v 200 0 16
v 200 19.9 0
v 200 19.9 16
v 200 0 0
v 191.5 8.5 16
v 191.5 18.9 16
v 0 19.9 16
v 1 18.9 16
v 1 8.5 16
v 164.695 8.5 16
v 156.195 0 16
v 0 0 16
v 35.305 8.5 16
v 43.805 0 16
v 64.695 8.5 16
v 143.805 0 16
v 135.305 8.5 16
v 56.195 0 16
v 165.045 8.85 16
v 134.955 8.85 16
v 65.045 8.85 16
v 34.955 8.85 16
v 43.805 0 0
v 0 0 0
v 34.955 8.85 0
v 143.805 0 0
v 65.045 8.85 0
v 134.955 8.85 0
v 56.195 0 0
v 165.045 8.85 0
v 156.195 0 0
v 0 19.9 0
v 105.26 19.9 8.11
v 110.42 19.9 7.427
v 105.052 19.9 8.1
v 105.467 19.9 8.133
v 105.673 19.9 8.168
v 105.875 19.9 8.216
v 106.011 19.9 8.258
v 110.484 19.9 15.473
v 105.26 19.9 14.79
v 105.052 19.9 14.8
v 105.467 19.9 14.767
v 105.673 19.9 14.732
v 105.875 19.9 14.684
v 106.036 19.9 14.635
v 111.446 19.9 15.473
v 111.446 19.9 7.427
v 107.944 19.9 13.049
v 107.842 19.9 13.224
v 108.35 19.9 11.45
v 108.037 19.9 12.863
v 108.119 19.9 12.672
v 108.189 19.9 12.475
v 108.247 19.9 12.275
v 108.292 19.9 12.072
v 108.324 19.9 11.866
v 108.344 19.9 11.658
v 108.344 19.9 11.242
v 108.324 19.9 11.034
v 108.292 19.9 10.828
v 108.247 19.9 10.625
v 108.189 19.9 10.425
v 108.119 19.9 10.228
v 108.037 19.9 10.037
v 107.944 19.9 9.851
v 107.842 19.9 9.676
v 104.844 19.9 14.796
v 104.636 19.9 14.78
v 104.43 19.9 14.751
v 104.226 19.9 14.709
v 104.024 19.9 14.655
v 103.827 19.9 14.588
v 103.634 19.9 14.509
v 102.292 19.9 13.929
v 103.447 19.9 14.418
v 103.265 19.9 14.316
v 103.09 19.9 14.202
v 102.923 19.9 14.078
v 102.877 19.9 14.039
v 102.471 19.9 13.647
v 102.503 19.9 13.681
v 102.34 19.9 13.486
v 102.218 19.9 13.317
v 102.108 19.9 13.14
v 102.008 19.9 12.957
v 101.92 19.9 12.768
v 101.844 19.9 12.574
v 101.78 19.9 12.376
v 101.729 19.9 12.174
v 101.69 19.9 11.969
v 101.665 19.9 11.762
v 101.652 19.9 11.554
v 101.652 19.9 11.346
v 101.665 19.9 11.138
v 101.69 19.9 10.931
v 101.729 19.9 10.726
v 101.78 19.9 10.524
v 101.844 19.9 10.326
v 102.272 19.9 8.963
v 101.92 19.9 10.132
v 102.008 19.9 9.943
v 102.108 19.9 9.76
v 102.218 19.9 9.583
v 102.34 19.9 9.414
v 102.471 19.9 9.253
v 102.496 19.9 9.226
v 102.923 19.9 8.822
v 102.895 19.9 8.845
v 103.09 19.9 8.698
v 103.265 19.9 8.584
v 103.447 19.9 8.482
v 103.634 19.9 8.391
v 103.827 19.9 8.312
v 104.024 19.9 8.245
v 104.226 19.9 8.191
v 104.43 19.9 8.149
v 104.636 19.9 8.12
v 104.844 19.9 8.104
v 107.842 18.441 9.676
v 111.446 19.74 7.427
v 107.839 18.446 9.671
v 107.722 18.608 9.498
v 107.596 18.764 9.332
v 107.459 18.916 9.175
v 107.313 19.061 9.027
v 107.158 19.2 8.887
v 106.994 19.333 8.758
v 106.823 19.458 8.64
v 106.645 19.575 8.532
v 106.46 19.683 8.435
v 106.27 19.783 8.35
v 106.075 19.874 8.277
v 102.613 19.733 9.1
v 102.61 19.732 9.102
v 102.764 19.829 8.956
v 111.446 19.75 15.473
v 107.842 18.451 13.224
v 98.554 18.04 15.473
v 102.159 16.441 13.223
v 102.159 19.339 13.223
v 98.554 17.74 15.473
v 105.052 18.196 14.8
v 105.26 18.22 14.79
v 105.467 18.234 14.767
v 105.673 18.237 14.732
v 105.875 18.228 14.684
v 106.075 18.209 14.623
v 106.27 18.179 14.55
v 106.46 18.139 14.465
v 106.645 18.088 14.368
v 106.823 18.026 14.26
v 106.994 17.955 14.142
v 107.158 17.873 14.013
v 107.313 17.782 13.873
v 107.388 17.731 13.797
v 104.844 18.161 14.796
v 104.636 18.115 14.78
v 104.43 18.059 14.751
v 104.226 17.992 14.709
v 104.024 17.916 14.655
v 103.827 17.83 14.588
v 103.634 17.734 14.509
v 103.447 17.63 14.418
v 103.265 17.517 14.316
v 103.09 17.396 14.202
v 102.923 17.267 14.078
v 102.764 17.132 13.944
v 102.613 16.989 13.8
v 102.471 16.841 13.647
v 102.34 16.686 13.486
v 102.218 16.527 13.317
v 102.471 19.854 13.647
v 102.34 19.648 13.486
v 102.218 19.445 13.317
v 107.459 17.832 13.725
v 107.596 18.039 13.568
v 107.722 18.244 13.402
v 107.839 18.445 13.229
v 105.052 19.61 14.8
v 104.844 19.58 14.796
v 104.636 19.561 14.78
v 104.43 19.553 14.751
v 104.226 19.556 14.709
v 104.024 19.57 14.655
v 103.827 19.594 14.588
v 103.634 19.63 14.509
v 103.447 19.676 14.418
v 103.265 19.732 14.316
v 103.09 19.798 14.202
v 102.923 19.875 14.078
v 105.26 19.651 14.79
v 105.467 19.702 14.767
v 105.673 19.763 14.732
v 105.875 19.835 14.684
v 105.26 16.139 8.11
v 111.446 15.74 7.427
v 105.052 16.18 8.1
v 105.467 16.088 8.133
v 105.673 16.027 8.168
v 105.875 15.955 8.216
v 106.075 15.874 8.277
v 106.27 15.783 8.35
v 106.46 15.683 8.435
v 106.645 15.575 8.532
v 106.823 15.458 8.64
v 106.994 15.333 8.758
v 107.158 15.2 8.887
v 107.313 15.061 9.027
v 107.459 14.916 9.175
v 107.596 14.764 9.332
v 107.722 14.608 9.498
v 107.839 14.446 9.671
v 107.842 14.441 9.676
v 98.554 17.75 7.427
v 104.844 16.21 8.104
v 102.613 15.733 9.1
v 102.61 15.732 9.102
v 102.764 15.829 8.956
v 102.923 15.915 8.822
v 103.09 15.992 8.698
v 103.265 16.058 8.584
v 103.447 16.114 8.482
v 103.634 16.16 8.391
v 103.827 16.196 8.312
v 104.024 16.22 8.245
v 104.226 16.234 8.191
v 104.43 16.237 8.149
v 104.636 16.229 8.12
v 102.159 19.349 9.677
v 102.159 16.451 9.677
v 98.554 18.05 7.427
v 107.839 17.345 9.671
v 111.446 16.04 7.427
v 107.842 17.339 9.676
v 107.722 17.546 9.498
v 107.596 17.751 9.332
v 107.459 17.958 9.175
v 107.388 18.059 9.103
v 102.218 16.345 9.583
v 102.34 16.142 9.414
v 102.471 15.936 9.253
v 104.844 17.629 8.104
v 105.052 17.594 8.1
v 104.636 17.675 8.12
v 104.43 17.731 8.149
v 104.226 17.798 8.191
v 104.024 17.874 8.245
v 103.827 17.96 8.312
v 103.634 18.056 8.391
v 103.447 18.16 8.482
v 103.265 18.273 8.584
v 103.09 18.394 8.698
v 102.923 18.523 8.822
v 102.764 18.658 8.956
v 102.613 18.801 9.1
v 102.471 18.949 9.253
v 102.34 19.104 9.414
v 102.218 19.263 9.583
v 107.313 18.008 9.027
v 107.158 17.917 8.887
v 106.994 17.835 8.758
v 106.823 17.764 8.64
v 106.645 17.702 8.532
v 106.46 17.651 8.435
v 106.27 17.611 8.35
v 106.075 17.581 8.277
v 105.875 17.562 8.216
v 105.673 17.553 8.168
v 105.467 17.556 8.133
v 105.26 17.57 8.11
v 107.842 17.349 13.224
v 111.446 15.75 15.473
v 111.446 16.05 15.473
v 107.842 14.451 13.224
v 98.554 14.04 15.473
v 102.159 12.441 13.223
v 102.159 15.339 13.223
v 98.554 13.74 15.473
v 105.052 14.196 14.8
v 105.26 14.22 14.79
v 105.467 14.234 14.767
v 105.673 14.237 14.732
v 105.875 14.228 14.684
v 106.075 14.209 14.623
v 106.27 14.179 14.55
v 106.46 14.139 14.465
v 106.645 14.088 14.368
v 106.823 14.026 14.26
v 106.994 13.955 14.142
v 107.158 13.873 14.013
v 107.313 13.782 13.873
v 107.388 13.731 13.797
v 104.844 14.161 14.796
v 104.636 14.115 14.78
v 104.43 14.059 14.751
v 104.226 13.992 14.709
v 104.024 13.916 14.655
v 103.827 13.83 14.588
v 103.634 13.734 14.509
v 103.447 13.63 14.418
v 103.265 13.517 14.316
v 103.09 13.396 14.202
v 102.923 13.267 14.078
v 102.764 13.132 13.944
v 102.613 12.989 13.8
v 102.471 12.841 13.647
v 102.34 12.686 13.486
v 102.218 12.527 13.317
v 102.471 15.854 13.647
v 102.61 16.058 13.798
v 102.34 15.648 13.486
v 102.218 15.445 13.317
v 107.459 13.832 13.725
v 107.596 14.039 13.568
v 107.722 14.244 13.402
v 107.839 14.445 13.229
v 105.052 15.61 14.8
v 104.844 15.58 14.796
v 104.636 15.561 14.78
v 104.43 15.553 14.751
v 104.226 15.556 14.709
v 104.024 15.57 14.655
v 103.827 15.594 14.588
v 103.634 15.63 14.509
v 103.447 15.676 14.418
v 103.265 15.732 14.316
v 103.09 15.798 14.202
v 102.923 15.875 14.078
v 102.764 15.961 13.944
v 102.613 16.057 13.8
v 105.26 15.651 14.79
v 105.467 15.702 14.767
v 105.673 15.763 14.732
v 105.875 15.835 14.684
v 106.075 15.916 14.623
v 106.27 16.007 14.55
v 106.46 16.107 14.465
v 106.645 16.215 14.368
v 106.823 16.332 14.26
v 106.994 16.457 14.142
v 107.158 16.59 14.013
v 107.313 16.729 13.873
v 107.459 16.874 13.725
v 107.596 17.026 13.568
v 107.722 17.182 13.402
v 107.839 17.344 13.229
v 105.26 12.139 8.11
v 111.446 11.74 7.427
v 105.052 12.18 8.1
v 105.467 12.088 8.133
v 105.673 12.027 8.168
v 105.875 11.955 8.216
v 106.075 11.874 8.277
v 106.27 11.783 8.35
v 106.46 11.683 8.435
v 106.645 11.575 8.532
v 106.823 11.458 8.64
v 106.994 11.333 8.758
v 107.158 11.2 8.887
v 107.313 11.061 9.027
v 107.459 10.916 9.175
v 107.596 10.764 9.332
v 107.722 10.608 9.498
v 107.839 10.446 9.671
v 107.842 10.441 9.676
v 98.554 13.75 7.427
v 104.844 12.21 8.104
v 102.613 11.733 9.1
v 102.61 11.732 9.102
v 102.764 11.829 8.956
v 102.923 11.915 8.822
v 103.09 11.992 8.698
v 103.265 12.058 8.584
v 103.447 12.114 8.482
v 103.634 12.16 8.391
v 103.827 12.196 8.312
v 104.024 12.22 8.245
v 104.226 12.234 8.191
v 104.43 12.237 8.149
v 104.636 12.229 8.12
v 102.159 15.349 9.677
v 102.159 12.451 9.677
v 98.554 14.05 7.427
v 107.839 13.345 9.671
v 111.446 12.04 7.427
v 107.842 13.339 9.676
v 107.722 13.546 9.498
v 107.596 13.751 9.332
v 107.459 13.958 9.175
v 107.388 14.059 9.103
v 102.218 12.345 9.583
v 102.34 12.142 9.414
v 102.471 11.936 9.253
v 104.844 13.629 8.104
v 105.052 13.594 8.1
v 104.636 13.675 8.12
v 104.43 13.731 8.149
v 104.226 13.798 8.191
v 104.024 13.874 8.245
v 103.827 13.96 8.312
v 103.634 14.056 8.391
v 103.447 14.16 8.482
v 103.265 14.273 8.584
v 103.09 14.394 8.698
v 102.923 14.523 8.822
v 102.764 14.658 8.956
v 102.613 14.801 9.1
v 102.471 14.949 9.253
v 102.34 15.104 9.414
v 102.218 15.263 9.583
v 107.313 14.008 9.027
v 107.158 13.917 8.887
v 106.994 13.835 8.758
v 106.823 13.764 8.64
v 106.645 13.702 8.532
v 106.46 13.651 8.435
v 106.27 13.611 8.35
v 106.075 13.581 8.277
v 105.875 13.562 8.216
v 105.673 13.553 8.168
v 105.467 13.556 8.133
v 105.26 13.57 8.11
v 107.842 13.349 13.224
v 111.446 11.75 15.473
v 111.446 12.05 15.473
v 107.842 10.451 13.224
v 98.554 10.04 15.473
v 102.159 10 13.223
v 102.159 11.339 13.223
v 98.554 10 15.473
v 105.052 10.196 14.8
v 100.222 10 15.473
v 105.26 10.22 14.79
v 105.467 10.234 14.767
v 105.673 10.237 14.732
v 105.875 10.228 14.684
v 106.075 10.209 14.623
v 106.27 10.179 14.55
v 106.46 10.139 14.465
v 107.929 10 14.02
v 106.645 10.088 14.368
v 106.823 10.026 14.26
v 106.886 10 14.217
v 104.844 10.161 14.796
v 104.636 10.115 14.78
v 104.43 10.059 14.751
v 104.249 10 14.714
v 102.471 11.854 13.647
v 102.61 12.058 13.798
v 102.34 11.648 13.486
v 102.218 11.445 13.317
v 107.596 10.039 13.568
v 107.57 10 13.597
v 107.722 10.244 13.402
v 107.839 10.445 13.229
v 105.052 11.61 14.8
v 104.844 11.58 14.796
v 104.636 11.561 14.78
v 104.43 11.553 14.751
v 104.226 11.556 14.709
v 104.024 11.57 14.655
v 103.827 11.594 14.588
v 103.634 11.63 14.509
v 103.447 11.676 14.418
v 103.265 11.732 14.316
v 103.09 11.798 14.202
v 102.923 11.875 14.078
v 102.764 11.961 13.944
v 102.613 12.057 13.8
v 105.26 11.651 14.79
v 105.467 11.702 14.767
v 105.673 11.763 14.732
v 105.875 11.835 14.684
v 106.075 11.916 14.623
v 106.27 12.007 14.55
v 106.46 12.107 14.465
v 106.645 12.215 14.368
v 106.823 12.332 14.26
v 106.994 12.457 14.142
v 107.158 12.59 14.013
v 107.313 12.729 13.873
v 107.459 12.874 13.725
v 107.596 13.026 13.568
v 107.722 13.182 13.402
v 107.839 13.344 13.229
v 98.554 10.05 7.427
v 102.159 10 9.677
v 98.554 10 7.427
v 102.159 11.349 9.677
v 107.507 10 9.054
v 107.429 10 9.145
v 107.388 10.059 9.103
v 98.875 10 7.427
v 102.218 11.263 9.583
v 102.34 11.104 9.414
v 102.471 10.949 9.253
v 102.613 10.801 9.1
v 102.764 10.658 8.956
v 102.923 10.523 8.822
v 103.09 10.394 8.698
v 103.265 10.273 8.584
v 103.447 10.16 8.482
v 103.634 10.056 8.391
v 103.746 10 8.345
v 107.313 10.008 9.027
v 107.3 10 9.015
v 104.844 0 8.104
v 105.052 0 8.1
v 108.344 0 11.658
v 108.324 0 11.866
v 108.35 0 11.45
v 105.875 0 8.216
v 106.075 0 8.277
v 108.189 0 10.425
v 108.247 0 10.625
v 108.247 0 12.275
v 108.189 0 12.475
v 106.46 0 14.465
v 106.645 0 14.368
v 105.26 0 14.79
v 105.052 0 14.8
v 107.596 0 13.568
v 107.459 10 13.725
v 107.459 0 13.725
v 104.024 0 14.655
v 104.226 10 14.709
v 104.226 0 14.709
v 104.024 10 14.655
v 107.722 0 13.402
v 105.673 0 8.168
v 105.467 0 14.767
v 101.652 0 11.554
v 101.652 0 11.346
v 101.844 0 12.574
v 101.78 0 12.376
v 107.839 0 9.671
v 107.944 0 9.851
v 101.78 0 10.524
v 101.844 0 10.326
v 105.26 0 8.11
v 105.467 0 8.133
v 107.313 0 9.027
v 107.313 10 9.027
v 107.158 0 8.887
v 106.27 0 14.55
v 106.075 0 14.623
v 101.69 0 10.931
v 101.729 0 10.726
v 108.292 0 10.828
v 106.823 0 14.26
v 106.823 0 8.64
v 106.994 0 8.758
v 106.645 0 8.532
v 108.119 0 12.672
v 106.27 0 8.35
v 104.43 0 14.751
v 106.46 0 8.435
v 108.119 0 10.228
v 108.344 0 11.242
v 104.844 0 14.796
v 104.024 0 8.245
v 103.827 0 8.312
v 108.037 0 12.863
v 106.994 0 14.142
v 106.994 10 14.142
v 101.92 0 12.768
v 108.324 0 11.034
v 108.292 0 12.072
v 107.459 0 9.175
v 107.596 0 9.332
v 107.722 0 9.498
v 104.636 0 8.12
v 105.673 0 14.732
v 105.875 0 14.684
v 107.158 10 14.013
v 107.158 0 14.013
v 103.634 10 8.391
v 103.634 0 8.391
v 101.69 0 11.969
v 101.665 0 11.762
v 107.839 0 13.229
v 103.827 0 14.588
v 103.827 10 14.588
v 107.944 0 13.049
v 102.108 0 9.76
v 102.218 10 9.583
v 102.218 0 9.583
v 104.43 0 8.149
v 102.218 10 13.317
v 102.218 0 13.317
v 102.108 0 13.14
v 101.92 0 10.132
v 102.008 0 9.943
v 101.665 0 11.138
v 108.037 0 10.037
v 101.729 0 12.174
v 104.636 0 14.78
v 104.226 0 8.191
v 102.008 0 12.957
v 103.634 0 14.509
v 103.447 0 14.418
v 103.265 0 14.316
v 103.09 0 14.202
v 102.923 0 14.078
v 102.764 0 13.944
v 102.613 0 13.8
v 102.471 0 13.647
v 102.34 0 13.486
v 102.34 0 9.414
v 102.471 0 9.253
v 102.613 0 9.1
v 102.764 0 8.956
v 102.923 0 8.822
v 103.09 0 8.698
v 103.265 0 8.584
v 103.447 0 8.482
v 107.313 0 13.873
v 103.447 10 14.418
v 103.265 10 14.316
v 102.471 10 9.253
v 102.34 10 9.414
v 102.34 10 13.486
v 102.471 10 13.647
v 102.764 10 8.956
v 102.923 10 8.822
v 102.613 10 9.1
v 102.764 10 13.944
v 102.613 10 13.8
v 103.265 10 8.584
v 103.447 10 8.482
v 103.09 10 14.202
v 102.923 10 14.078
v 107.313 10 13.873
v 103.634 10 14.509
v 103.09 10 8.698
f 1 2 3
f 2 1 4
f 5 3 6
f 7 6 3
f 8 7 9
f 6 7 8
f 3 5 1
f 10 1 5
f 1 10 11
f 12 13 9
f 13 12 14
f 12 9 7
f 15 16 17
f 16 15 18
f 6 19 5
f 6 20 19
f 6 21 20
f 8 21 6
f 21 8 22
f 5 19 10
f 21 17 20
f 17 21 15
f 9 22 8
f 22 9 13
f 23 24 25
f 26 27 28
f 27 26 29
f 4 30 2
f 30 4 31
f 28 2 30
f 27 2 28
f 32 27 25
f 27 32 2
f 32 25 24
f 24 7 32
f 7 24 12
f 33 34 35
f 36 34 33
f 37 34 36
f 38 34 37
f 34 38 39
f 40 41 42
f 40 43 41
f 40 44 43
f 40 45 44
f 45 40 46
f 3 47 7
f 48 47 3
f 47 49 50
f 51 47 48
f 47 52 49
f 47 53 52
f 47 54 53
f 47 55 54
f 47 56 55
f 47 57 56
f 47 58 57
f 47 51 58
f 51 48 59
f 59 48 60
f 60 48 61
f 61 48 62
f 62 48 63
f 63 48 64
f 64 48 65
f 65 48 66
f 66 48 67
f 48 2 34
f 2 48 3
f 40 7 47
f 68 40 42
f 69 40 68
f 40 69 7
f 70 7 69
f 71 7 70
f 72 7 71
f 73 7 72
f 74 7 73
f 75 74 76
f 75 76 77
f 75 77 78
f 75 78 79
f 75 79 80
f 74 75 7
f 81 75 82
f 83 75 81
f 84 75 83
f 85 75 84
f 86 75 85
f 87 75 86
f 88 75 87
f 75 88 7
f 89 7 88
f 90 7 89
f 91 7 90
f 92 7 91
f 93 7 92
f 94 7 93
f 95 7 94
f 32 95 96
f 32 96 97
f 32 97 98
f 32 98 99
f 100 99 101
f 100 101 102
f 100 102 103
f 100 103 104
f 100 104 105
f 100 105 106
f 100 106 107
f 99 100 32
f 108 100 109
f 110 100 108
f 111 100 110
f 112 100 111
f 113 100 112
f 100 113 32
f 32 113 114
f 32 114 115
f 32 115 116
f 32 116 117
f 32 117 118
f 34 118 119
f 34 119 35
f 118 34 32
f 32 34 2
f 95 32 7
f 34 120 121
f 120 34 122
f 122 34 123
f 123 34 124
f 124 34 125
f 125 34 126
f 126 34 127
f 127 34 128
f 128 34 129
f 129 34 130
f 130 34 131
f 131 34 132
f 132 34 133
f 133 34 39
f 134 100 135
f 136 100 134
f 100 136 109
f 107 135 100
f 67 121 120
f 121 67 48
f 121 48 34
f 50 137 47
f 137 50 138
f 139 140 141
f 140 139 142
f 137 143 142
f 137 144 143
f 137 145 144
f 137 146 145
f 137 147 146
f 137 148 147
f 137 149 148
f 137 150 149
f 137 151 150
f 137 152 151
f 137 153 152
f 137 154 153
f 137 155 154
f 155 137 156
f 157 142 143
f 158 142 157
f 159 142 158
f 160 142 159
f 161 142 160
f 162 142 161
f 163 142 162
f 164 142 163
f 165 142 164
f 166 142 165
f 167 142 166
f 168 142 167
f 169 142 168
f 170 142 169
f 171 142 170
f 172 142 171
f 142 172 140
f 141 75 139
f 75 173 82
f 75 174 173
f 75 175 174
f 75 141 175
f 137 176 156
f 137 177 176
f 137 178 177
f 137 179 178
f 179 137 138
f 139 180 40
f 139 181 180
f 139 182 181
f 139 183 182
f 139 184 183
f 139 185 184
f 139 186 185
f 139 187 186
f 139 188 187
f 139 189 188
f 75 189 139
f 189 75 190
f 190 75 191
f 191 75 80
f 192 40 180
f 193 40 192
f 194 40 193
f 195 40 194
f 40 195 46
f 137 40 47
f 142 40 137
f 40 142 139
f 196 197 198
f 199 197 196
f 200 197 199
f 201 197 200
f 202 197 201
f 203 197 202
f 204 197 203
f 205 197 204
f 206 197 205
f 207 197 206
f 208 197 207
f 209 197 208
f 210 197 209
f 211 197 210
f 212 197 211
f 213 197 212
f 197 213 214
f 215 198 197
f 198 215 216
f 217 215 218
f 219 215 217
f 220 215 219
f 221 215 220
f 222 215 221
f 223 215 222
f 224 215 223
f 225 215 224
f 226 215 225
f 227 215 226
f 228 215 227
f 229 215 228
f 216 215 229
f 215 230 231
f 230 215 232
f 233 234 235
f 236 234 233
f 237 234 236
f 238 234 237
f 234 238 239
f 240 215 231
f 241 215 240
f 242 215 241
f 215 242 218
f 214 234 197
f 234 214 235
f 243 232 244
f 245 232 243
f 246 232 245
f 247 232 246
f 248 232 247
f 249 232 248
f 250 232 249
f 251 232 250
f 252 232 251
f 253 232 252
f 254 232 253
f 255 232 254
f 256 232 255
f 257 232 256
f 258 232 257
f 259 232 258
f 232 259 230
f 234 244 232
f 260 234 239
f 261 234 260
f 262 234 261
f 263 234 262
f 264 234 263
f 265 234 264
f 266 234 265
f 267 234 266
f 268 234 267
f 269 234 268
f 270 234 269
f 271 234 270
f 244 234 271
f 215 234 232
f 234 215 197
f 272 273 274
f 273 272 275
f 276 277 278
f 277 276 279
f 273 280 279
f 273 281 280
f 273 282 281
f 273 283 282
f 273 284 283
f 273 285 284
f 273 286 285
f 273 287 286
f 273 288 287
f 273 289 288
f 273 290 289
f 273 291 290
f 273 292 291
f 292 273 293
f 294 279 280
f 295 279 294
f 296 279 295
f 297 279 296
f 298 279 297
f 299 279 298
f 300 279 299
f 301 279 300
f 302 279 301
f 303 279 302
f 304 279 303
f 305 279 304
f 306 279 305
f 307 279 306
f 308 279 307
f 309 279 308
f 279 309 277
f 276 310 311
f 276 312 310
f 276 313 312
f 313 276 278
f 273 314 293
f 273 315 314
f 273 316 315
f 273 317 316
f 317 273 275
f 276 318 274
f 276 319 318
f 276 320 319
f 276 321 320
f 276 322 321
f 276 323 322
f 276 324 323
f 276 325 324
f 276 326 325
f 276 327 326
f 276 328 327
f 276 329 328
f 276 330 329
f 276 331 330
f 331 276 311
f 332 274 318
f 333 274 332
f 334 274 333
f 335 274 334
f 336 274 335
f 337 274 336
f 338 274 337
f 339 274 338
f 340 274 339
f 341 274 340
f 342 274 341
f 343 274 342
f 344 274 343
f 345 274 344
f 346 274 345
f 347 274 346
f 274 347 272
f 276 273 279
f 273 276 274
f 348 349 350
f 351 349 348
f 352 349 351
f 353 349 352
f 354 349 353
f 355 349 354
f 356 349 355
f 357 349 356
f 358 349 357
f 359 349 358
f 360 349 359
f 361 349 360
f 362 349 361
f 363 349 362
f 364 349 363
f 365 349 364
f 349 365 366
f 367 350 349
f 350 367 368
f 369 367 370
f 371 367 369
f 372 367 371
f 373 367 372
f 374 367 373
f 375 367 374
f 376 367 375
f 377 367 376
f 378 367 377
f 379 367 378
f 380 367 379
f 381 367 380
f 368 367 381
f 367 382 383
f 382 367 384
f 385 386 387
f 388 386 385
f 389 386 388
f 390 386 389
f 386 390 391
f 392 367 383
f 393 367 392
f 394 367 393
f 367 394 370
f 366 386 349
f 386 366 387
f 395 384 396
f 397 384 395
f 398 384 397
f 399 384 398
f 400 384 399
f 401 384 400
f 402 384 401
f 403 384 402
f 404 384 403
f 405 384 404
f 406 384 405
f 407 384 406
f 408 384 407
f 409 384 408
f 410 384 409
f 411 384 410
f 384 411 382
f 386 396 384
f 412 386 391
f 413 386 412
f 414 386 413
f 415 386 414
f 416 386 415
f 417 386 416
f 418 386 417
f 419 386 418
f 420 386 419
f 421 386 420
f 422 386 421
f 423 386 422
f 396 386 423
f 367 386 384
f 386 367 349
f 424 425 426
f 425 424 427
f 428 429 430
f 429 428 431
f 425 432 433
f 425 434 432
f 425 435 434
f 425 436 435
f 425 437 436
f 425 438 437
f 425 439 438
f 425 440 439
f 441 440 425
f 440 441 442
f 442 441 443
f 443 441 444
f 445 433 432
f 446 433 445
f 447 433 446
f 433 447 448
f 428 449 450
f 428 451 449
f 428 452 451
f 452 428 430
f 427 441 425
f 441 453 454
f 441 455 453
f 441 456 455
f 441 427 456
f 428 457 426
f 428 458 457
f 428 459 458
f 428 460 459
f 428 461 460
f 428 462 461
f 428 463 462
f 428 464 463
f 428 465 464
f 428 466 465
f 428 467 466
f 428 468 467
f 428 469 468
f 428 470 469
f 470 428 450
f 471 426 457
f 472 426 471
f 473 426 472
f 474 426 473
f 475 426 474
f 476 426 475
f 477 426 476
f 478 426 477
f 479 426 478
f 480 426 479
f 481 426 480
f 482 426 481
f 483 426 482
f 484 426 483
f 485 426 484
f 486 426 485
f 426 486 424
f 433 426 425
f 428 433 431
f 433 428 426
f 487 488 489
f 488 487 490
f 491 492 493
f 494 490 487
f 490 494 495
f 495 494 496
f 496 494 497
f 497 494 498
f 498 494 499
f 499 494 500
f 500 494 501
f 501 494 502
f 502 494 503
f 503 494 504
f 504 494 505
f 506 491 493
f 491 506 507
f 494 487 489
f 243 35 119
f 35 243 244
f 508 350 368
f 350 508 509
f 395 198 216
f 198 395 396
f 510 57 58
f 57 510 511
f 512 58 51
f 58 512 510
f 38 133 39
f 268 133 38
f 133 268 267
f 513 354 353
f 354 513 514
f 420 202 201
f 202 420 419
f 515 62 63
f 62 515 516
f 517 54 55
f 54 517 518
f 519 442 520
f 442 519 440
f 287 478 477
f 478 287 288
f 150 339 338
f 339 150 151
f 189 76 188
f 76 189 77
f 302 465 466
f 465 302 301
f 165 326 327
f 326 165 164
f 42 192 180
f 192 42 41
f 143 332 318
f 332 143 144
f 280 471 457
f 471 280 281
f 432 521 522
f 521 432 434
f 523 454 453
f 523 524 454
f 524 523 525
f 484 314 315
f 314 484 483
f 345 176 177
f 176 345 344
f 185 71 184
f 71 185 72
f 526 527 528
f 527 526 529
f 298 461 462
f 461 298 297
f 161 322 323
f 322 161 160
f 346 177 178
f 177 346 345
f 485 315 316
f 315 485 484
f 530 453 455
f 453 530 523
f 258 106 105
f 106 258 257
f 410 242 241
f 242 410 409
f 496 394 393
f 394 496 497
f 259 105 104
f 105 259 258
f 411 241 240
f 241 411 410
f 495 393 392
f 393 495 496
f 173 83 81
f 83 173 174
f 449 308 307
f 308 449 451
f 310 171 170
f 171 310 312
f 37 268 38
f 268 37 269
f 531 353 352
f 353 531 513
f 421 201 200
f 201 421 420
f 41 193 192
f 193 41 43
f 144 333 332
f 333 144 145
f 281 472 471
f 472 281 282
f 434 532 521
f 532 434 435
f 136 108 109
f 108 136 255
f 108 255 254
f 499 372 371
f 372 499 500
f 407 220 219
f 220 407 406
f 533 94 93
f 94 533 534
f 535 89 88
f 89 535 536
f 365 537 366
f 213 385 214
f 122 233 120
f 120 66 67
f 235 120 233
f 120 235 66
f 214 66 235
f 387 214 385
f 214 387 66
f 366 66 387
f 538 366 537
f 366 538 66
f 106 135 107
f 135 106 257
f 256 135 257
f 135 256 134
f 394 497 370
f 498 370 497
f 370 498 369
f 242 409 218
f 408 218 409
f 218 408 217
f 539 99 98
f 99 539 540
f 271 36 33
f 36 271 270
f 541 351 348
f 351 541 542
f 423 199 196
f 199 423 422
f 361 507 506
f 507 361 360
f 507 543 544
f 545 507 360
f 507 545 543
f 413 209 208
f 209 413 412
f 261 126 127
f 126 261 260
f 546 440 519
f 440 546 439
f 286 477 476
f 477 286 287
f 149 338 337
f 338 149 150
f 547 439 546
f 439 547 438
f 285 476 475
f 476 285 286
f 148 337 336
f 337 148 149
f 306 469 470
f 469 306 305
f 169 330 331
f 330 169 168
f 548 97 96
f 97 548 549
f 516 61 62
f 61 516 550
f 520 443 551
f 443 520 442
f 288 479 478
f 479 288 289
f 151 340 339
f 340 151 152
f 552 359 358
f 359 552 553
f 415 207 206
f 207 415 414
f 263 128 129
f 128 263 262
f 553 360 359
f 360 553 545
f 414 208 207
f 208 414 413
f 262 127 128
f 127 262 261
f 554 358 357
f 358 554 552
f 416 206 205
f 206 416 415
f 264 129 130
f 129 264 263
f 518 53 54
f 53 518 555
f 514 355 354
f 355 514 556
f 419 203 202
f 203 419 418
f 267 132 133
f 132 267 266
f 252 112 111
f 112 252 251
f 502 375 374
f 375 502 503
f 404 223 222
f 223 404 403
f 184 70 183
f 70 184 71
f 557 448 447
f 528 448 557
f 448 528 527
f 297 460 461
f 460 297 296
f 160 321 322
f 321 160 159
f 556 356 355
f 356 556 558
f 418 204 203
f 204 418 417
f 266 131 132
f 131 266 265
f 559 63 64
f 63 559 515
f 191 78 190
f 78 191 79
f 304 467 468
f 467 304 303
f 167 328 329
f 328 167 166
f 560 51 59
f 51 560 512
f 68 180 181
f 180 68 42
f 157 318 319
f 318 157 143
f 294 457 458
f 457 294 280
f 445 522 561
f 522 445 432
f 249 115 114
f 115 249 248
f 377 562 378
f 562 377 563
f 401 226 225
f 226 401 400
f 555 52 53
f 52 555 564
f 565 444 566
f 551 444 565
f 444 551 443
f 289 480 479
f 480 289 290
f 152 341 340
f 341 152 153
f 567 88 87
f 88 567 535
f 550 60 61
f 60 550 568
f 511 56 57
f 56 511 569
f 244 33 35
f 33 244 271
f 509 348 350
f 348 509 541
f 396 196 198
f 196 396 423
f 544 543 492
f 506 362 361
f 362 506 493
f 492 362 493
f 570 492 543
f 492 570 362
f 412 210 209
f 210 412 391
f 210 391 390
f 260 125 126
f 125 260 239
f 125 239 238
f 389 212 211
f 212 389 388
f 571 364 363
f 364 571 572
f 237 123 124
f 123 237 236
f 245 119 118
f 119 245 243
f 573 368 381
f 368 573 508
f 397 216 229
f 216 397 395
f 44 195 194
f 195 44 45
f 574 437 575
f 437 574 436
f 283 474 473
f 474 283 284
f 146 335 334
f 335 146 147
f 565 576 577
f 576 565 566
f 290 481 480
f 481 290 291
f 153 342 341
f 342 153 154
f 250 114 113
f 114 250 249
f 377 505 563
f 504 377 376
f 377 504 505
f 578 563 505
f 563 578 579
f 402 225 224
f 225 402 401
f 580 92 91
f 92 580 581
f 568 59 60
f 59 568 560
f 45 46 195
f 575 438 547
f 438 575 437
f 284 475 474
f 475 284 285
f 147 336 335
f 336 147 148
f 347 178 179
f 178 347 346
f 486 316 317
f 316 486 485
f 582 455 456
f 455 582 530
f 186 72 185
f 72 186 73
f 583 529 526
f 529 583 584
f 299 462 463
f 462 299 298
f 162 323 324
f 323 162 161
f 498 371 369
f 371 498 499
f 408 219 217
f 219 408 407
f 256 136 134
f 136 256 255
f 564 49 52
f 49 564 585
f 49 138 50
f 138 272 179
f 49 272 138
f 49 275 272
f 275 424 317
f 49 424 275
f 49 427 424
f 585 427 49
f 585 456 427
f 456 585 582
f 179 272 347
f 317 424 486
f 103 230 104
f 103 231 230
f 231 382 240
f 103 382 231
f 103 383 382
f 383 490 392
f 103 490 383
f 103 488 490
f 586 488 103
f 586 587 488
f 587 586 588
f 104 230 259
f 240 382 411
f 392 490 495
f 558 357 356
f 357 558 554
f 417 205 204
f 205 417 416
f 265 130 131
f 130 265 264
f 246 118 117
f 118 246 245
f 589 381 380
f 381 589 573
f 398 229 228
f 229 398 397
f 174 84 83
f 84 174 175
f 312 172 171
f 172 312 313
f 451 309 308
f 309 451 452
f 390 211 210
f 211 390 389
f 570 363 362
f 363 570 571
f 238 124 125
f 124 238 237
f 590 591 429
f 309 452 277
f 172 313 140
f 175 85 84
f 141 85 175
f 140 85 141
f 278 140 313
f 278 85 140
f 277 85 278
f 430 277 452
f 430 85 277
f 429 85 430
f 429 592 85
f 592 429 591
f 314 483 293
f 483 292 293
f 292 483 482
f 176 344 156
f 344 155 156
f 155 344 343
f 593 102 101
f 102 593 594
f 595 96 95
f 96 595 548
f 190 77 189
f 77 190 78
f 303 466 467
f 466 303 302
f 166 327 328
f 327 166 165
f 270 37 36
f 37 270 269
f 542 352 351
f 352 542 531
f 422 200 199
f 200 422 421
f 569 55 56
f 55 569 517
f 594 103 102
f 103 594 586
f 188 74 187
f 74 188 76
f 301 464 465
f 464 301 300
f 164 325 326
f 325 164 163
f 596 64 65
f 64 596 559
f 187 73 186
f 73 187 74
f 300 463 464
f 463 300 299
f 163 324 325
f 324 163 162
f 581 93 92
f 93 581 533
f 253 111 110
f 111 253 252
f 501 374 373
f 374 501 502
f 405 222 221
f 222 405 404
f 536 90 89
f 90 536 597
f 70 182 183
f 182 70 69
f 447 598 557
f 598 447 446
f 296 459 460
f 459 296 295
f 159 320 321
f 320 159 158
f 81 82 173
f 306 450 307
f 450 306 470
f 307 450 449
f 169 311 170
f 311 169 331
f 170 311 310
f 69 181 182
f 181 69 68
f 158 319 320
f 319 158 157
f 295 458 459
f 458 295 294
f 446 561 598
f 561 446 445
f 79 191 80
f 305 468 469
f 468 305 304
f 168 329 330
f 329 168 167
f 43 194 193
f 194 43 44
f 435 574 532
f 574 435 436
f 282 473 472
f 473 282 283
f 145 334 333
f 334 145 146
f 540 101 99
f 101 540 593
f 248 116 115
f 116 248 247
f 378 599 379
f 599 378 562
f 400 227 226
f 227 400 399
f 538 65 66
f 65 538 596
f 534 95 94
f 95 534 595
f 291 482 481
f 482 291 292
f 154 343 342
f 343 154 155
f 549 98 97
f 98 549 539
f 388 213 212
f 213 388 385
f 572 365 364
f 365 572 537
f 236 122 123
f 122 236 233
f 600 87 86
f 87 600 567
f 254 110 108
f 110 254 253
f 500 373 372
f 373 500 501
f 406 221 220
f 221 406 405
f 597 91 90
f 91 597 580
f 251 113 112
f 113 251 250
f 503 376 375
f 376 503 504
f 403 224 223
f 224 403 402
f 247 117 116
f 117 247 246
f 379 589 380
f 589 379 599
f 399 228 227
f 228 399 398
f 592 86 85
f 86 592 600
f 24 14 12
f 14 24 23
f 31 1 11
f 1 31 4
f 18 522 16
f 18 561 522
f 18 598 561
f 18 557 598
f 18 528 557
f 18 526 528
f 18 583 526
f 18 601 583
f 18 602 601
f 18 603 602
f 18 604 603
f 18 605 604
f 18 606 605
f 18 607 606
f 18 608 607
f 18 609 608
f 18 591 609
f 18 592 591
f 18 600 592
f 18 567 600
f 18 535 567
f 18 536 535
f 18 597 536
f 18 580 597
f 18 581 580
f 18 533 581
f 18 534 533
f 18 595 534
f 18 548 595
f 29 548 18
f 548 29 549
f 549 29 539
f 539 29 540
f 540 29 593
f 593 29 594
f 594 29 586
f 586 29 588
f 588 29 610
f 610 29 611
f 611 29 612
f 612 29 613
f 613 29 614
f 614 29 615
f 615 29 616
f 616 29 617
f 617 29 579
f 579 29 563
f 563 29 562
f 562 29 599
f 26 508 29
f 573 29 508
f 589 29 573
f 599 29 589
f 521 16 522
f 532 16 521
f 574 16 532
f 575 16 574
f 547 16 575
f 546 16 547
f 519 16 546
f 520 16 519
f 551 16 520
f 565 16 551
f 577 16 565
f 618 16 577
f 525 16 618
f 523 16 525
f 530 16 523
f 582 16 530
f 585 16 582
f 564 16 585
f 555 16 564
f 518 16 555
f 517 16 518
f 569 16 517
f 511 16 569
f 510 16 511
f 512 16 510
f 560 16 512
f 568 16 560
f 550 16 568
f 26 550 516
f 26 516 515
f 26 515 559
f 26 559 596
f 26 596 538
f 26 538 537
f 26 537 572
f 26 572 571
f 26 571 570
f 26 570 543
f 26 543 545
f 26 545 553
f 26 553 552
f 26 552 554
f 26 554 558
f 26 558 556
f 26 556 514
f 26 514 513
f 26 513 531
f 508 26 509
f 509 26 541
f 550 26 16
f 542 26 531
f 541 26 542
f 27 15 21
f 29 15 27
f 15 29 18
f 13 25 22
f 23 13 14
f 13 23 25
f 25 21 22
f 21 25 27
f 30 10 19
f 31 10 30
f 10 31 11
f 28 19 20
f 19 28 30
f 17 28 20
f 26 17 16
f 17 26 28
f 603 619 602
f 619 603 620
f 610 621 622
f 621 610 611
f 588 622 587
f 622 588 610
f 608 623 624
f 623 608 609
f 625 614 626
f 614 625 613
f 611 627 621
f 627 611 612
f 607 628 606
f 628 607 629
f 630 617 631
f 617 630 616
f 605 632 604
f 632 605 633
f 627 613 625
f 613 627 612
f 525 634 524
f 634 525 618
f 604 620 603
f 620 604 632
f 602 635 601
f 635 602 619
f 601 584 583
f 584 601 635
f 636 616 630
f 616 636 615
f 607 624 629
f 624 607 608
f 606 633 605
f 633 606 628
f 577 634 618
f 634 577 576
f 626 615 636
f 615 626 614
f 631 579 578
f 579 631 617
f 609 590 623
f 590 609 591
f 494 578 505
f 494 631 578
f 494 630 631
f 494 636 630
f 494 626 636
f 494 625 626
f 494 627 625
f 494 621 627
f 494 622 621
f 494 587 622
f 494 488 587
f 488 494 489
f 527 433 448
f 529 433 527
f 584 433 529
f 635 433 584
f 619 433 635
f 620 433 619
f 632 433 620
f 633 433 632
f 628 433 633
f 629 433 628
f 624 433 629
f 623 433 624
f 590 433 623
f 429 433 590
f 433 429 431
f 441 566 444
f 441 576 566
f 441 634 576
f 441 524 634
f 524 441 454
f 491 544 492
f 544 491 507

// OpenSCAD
// file: phillips.scad
$fs=0.2;
$fa=0.2;

headNum = 2;

phillipsDrive(headNum);
//phillipsDemo(headNum);

module phillipsDemo(num) {
  difference() {
    cylinder(d=8,h=3);
    translate([0,0,3-1.7]) rotate([180,0]) phillipsDrive(num);
  }

  translate([0,0,3-1.7+3*(1+cos(360*$t))/2]) rotate([180,0]) phillipsDrive(num);
}

module phillipsDrive(S) {
  in = 25.4; // inches to mm
  
  // A Point Diameter
  // B Point Width
  // C Length
  // D Length
  // E Diameter
  // Fmax,Fmin Wing Thickness
  // G Point Width
  // H Milling angle
  // Jmax, Jmin Flat on End
  // K Base Flute Angle
  // L Side Flute Angle
  // M Flute Width at Bottom
  drives = [
    /* No. 0 */ [0.045, 0.0240, 0.656, 0.781, 0.094, 0.012, 0.010, 0.032, 7.00, 0.015, 0.010, 000.01, 92, 0.0151],
    /* No. 1 */ [0.087, 0.0394, 0.688, 0.812, 0.156, 0.020, 0.018, 0.050, 7.00, 0.020, 0.015, 138.00, 92, 0.0202],
    /* No. 2 */ [0.141, 0.0606, 0.750, 0.875, 0.219, 0.025, 0.023, 0.090, 5.75, 0.020, 0.015, 140.00, 92, 0.0434],
    /* No. 3 */ [0.209, 0.0983, 0.781, 0.906, 0.250, 0.031, 0.029, 0.150, 5.75, 0.020, 0.015, 146.00, 92, 0.0826],
    /* No. 4 */ [0.312, 0.1407, 0.844, 0.969, 0.359, 0.044, 0.042, 0.200, 7.00, 0.020, 0.015, 153.00, 92, 0.1078],
    /* No. 5 */ [0.500, 0.2310, 1.031, 1.156, 0.531, 0.063, 0.061, 0.311, 7.00, 0.025, 0.020, 162.77, 92, 0.1730],
  ];
  l = drives[S];
  _phillipsDrive(l[0]*in, l[1]*in, l[2]*in, l[3]*in, l[4]*in, (l[5]+l[6])/2*in, l[7]*in, l[8], (l[9]+l[10])/2*in, l[11], l[12], l[13]*in);
}

module _phillipsDrive(A_unused,B,C,D,E,F,G,H,J,K,L,M) {
  A=6.35;
  y1 = ((A-G)/2) / tan(26.5);
  y2 = ((G-J)/2) * tan(18);
  translate([0,0]) difference() {
    translate([0,0,0]) rotate_extrude() {
      polygon([
        [A/2,-y1-y2],
        [G/2,-y2],
        [J/2,0],
        [0,0],
        [0,-D],[E/2,-D],[E/2,-C],[A/2,-C]
      ]);
    }
    
  // not spec'd, eyeballing these values
  grindingRadius = 15; 
  grindLength = 1.5*(y1+y2);
  echo(grindLength);
  for (i = [0:3]) rotate(45+i*90)
    translate([B/2,0]) rotate([0,-H]) translate([0,0,-grindLength]) {
      linear_extrude(grindLength) phillipsFluteProfile(A,K,L,M);
      translate([grindingRadius,0]) rotate([90,0]) rotate_extrude() translate([grindingRadius,0]) rotate(180) phillipsFluteProfile(A,K,L,M);
    }
  }
}

module phillipsFluteProfile(A,K,L,M) {
  x1 = K < 1 ? K-K*cos((180-L)/2) : tan((180-K)/2)*M/2;
  x2 = x1 + tan((180-L)/2)*A/2;
  y1 = K < 1 ? K*sin((180-L)/2) : M/2;
  y2 = y1 + A/2;
  if (K < 1) { // PH 0 specifies radius instead of angle
    scale(1/100) union() {
      translate([100*K,0]) circle(r=K*100,$fn=30);
      polygon([
        [100*x1, 100*y1],[100*x2, 100*y2],[100*x2,100*-y2],[100*x1,100*-y1]  
      ]);
    }
  } else {
    polygon([
      [0,0],[x1, y1],[x2, y2],[x2,-y2],[x1,-y1]  
    ]);
  }
}
// file: basetile.scad
// Current data: 22h and 240g of PLA

use <../threads/isothreads.scad>
use <phillips.scad>

$fa = 1;
$fs = 0.4;

module dovetile(
    //Box Width in units
    BoxWidthUnits = 2,
    //Box Length in units
    BoxLengthUnits = 2,
    //Box Height in mm
    BoxHeight = 16,
    //Box Floor Thickness in mm
    BoxFloor = 16,
    //North Wall open or closed
    NorthWallOpen = 0, // [0:Closed, 1:Open]
    //South Wall open or closed
    SouthWallOpen = 0, // [0:Closed, 1:Open]
    //Add dove tails to side
    north=true,east=true,south=true,west=true
)
{
echo(version=version(2.0));
//comments: Version 2 adds anti-"elephant foot" scaling at bottom of dovetail sections
/* [Size] */
//Box unit size in mm. This defines the size of 1 'unit' for your box.
BoxUnits = 100;
BoxWidth = BoxWidthUnits * BoxUnits;
BoxLength = BoxLengthUnits * BoxUnits;
//Box Wall Thickness in mm
BoxWall = 1;
//Fit Factor. Greater factor = looser fit
FitFactor = 0.18;  // [0:0.05:0.4]
//RoundedBottom = "EW"; // [EW:East-West, NS:North-South]
RoundedBottom = ""; // [EW:East-West, NS:North-South]

/* [Walls] */

/* [Dovetail] */
//Dovetail inside length in mm
DTInsideLength = 10.5;
//Dovetail angle in degrees
DTAngle = 45;
//Dovetail width in mm
DTWidth = 7.5;

/* [Hidden] */
//This helps calculate the length of the 'long' side of the dovetail
DTx=tan(DTAngle)*DTWidth;
//This polygon defines the dovetail shape
DTShape = [[0,0],[DTInsideLength/2,0],[DTInsideLength/2+DTx,DTWidth],[-DTInsideLength/2-DTx,DTWidth],[-DTInsideLength/2,0]];



union(){

    //Creates main box,without round bottom
    difference(){
        
    union(){
        //main box
    cube([BoxLength,BoxWidth,BoxHeight], center=false);

    //male dovetails
    if (north)
    {
    for (i=[1:BoxLengthUnits])
    translate([(i-1)*BoxUnits+(BoxUnits/2),BoxWidth,0])
        linear_extrude(height=BoxHeight, center=false)
                union(){
                //this adds a slight offset to the male dovetail for a looser fit
                translate([-DTInsideLength/2,0,0])
                square([DTInsideLength,DTWidth]);
                //main dovetail shape
                translate([0,DTWidth*FitFactor*2,0])
                polygon(DTShape);
                };
      }
    if (west)
    {
    for (i=[1:BoxWidthUnits])
    translate([0,(i-1)*BoxUnits+(BoxUnits/2),0])
        rotate([0,0,90])
          linear_extrude(height=BoxHeight, center=false)
              union(){
                  //male dovetail offset
                  translate([-DTInsideLength/2,0,0])
                  square([DTInsideLength,DTWidth]);
                  //main dovetail shape
                  translate([0,DTWidth*FitFactor*2,0])
                  polygon(DTShape);
              };
    }
  }
    //female dovetails
    if (south)
    {
    for (i=[1:BoxLengthUnits])
        translate([(i-1)*BoxUnits+(BoxUnits/2),0,0])
            scale([1+FitFactor,1+FitFactor,1])
            linear_extrude(height=BoxHeight, center=false)
            polygon(DTShape);
    
      }
    if (east)
    {
    for (i=[1:BoxWidthUnits])
        translate([BoxLength,(i-1)*BoxUnits+(BoxUnits/2),0])
            rotate([0,0,90])
                scale([1+FitFactor,1+FitFactor,1])
                    linear_extrude(height=BoxHeight, center=false)
                        polygon(DTShape);
      }
    //carves out main box
    translate([BoxWall,DTWidth+BoxWall,BoxFloor])
        cube([BoxLength-(2*BoxWall)-DTWidth, (BoxWidth-(2*BoxWall)-DTWidth), BoxHeight]);

    if (NorthWallOpen)
        translate([-DTWidth*(1+FitFactor+FitFactor),BoxWall+DTWidth,BoxFloor])
            cube([BoxWall+(DTWidth*(1+FitFactor+FitFactor)), (BoxWidth-(2*BoxWall)-DTWidth), BoxHeight]);    

    if (SouthWallOpen)
        translate([BoxLength-(BoxWall)-DTWidth,BoxWall+DTWidth,BoxFloor])
            cube([BoxWall+DTWidth, (BoxWidth-(2*BoxWall)-DTWidth), BoxHeight]);

    }
  }
}

module basetile(north=true,east=true,south=true,west=true,height=16) {
  
  //This needs to be broken out as variables
  tilecountx=2;
  tilecounty=2;
  tilez=height;
  
  tilex = tilecountx * 105;
  tiley = tilecounty * 105;
  
  //Fit the rod
  holediameter=6.7;
  
  //For enough strength, and also matching Cura wall
  //Start with cura wall size
  curawalltopbottom=0.8;
  curainternalwall=0.4;
  wallmin=curawalltopbottom+curainternalwall;
  
  tileheight=tilez;
  
  //Offset holes to match wallmin from top/bottom wall
  holeoffset=tileheight/2-holediameter/2-wallmin;

  thread_size=1;
  pitch = 4;
  screwlength = 16;

  difference () {
    dovetile(tilecountx,tilecounty,tileheight,tileheight,0,0,north,east,south,west);
    translate([tilex/2,tiley/2,tilez/2+holeoffset]) rotate([90,0,0]) cylinder(d=holediameter,h=tilex,center=true);
    translate([tilex/2,tiley/2,tilez/2-holeoffset]) rotate([90,0,90]) cylinder(d=holediameter,h=tiley,center=true);
    if (!south) {
      translate([tilex/2,screwlength*2,tilez/2+holeoffset]) rotate([90,0,0]) metric_thread(diameter=holediameter+thread_size,pitch=pitch,length=tileheight*2,internal=true);
    }
    if (!north) {
      translate([tilex/2,tiley+6-screwlength,tilez/2+holeoffset]) rotate([90,0,0]) metric_thread(diameter=holediameter+thread_size,pitch=pitch,length=tileheight*2,internal=true);
    }
    if (!east) {
      translate([tilex/2,screwlength*2,tilez/2+holeoffset]) rotate([90,0,0]) metric_thread(diameter=holediameter+thread_size,pitch=pitch,length=tileheight*2,internal=true);
    }
    if (!west) {
      translate([tilex/2,tiley+6-screwlength,tilez/2+holeoffset]) rotate([90,0,0]) metric_thread(diameter=holediameter+thread_size,pitch=pitch,length=tileheight*2,internal=true);
    }
  }
}



module screwrod () {
  difference () {
    metric_thread(diameter=holediameter+thread_size,thread_size=thread_size, pitch=4,length=screwlength/2,internal=false);
    translate([0,0,4.5]) phillipsDrive(2);
  }
}

basetile(true,true,true,true);
// main file
// Create sliver of one side with the straight edge

use <basetile.scad>

$fn = 101;
height=16;

module sliver(side="north",west=true,height=16,width=10) {
  //straight edge
  translate([0,1.99*width-200,0])
  difference () {
    basetile(false,false,false,false,height);
    translate([0,0,0]) cube([200,200-width,height]);
  }
  
  //dovetail edge
  difference () {
    basetile(true,true,true,true,height);
    translate([-50,width,0]) cube([300,300,height]);
  }
  
}

sliver();
